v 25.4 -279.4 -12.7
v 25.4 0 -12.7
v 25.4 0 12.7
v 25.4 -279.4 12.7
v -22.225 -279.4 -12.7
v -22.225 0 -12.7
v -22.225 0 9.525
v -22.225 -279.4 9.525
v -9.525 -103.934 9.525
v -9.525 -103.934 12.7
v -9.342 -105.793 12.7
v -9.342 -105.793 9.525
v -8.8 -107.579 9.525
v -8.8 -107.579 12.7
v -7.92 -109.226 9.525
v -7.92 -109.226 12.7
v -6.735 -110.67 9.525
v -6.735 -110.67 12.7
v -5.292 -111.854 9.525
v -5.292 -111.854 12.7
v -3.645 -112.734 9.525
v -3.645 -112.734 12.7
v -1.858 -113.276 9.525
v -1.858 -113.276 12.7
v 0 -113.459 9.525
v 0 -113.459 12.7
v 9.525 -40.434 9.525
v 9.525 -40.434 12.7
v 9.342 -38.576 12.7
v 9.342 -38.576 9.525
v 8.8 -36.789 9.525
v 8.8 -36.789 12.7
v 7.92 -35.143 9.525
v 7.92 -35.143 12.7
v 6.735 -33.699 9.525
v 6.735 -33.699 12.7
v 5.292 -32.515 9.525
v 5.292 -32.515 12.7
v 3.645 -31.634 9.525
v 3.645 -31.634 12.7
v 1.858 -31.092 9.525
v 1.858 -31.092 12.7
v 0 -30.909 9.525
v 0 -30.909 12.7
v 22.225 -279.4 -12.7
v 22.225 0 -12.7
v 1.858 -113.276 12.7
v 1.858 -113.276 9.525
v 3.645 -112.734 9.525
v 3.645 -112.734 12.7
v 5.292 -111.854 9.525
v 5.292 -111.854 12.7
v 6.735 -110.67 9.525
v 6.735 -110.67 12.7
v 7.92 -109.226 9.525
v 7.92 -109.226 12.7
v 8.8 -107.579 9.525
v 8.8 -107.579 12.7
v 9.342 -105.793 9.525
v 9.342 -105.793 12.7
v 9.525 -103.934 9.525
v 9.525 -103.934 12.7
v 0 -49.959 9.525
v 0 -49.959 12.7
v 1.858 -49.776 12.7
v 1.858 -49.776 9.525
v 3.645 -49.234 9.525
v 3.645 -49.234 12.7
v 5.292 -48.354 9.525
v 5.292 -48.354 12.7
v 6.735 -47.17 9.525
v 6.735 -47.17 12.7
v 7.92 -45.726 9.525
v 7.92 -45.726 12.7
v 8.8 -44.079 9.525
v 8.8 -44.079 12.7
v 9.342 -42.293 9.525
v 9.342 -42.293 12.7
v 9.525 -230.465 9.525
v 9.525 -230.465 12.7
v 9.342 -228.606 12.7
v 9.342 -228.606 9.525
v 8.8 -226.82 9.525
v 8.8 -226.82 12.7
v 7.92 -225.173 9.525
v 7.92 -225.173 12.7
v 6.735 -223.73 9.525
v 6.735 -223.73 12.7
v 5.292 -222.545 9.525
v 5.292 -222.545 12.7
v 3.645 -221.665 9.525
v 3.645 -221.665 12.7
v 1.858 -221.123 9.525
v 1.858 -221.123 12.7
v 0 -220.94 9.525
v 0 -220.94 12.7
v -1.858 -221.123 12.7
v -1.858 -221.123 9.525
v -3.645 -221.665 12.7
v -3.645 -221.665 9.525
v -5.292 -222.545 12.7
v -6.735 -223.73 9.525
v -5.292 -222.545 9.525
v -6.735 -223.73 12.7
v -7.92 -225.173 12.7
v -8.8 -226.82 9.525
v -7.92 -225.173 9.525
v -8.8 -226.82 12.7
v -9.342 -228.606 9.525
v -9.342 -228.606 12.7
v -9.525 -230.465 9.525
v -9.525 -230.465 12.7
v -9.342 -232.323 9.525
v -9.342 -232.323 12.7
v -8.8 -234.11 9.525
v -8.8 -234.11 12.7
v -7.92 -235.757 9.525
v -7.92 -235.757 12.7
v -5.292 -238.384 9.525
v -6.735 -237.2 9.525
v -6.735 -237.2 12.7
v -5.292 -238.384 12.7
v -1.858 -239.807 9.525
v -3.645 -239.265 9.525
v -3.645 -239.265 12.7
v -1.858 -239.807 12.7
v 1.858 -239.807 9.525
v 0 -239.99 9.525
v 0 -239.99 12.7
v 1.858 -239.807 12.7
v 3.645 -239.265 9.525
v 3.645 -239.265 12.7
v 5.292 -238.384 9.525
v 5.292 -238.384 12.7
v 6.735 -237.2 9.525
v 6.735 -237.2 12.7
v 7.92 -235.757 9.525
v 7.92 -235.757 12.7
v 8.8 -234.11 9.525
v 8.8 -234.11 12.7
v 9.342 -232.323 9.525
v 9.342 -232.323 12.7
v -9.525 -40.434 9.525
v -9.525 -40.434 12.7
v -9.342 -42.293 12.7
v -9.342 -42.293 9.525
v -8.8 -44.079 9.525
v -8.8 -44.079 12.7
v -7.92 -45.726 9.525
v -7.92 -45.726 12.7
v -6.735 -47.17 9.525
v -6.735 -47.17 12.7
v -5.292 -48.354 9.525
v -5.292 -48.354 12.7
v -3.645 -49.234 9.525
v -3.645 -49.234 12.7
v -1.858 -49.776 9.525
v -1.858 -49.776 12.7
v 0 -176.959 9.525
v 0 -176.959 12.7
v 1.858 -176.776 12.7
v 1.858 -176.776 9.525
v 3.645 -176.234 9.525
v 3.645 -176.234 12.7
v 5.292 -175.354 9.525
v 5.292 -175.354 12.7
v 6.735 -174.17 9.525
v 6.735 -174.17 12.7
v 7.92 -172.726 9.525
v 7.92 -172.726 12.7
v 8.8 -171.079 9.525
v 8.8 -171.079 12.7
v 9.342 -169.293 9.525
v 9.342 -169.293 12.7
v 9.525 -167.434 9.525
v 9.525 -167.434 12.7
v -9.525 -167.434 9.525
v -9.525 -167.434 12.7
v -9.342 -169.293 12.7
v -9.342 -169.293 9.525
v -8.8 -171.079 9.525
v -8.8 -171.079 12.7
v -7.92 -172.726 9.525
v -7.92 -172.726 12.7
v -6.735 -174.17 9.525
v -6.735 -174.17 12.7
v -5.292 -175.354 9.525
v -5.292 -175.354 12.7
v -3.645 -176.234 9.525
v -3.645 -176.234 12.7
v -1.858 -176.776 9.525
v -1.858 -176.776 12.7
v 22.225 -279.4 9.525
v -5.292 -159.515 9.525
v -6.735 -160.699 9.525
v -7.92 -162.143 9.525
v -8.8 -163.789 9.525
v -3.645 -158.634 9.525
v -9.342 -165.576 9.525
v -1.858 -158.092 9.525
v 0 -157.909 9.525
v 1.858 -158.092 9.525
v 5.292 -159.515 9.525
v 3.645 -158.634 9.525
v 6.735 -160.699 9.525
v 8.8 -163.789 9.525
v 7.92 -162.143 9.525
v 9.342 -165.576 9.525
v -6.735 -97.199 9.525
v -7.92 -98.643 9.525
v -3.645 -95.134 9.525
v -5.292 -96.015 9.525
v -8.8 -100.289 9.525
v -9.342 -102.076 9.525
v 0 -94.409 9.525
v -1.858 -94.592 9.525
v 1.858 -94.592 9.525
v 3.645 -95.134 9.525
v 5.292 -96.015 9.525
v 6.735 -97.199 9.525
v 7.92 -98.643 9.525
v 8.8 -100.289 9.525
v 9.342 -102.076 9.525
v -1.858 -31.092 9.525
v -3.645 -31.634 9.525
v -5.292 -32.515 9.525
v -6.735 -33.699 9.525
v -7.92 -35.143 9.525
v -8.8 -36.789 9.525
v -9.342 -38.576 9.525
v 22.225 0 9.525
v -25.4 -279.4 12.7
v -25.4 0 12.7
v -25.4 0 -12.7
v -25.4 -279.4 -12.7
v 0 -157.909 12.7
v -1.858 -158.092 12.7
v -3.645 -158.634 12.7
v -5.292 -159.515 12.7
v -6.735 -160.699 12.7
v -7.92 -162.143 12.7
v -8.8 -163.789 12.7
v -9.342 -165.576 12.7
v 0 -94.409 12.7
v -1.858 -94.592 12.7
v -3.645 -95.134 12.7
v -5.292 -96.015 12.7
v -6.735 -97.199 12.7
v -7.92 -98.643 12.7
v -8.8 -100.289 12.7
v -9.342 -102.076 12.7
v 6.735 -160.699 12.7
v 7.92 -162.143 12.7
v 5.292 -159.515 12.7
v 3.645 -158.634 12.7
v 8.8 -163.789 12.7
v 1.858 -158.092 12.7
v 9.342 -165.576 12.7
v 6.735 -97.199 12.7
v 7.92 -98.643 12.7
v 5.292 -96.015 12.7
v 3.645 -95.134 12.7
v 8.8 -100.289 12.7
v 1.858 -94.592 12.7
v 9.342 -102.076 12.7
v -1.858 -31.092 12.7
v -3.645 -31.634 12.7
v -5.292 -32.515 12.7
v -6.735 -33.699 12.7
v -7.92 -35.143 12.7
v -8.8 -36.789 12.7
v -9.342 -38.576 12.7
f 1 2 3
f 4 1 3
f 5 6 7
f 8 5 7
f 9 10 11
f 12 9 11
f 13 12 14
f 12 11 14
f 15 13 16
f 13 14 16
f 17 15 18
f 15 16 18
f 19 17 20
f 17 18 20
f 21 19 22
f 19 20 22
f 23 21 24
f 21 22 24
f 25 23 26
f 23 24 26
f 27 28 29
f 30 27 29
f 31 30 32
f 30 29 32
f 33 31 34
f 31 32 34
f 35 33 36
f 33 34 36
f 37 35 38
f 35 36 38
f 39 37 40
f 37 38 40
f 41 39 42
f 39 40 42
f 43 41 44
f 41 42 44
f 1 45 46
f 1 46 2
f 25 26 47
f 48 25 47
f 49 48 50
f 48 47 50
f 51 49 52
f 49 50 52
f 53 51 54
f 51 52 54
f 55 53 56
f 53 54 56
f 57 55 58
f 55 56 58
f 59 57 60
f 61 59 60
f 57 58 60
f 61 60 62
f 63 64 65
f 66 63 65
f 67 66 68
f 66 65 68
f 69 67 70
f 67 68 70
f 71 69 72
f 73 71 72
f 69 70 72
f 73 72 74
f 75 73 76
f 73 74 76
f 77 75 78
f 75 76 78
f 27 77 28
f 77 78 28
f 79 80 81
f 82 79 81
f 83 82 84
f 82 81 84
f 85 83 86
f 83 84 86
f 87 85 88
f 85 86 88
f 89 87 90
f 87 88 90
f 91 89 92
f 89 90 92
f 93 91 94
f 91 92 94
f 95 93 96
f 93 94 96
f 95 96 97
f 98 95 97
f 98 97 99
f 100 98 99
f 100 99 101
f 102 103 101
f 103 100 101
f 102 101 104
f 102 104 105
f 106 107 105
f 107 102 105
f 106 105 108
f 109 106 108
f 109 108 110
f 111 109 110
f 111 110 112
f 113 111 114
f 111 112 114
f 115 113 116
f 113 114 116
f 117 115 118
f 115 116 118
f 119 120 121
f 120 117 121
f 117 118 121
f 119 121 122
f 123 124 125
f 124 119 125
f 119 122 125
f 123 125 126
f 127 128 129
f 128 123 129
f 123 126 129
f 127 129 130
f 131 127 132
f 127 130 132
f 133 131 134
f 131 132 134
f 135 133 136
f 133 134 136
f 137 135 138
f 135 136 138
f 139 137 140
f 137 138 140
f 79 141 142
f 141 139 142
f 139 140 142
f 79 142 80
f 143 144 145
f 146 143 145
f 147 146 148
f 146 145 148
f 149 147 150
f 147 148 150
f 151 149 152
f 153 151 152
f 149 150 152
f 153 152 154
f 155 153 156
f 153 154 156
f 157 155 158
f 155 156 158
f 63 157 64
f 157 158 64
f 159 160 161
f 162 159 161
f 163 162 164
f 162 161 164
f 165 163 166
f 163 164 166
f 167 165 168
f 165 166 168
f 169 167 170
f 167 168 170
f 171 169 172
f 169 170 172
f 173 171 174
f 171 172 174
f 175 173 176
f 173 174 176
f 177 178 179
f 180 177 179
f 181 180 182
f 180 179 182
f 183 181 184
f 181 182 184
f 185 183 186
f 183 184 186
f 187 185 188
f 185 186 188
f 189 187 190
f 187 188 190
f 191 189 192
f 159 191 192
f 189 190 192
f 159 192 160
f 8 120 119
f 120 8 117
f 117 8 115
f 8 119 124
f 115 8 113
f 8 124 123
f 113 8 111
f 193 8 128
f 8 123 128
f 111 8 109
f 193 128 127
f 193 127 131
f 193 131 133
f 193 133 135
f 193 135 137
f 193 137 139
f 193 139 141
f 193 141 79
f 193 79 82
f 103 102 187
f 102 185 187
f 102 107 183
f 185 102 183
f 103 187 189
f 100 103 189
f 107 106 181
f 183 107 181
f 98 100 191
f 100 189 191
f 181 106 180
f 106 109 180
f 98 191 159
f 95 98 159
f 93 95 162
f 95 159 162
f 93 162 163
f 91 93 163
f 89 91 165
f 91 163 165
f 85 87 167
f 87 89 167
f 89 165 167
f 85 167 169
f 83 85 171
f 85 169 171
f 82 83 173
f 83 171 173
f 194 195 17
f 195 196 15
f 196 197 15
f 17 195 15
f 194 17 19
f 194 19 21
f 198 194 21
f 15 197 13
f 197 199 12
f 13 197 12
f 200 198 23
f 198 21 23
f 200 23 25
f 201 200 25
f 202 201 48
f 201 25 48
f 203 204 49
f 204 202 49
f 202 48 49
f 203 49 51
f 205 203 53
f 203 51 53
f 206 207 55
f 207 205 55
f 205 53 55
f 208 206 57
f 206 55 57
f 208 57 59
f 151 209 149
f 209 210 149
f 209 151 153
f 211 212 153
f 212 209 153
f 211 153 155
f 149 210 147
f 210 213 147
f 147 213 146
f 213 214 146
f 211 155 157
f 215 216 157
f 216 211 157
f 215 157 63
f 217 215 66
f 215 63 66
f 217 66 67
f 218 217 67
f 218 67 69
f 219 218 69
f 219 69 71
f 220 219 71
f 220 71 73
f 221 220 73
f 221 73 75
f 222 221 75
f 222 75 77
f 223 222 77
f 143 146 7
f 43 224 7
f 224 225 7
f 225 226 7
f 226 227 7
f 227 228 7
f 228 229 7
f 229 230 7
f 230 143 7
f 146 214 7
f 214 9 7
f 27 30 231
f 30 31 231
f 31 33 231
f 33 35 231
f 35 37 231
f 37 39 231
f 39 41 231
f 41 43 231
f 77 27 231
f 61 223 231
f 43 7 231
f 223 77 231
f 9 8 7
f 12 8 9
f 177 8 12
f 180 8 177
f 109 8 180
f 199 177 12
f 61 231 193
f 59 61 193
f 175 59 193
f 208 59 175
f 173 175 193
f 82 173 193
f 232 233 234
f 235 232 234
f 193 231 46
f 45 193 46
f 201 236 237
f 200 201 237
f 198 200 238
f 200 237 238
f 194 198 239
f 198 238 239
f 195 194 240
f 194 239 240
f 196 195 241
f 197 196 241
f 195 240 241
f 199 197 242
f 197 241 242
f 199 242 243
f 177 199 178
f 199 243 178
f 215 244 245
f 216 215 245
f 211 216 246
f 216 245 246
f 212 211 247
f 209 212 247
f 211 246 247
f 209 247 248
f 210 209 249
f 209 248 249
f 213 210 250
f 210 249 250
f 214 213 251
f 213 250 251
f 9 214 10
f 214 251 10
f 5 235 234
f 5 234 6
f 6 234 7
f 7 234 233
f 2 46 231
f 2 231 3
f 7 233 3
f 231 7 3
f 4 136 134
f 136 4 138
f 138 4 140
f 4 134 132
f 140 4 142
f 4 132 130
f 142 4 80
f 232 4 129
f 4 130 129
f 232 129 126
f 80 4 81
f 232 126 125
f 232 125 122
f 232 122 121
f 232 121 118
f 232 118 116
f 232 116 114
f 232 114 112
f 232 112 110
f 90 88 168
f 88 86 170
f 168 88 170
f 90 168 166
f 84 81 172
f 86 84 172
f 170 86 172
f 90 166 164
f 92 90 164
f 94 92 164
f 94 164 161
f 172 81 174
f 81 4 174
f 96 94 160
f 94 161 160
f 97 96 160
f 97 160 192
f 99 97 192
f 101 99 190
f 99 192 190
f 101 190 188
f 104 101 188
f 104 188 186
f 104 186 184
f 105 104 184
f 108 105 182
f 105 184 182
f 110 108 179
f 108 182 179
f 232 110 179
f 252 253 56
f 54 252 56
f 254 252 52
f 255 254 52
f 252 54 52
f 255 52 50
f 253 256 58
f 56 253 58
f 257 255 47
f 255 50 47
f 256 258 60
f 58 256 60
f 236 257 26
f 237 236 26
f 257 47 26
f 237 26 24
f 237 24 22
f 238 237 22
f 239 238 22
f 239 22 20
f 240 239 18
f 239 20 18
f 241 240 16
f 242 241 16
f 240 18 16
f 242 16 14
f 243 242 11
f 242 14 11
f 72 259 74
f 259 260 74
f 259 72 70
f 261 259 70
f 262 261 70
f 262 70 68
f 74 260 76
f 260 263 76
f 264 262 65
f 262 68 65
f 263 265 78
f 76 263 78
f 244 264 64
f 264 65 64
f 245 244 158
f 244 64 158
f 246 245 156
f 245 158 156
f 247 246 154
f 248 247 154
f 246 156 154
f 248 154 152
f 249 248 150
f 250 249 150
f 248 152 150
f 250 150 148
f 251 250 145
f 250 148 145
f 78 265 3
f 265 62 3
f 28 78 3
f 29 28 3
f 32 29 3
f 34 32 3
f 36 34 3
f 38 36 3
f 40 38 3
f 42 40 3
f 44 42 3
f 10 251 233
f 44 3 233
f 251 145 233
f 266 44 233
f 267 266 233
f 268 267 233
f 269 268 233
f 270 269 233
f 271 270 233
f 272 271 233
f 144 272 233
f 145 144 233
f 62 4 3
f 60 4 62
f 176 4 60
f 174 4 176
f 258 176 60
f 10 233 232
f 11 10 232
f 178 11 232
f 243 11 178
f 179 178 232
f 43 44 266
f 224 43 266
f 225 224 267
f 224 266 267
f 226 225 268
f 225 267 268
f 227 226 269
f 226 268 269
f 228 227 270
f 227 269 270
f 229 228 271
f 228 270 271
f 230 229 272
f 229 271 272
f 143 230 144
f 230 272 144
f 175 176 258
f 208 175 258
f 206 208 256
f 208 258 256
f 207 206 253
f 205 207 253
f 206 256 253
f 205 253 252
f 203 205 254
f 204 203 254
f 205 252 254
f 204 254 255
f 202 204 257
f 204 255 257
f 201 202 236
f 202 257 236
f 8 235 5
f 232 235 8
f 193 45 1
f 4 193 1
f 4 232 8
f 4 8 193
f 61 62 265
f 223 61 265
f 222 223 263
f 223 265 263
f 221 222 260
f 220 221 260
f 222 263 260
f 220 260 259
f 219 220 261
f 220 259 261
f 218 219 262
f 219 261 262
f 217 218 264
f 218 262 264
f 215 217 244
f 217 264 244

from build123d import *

# Parameters (mm, degrees)
F1_DEPTH = 279.4
F3_DEPTH = 25.401
F5_D     = 19.05


# Not quite as in the source:
# - a feature names something its author has since deleted; it is built from what else it names


with BuildPart() as f1:
    # F0 (on Front) → F1 (new body)
    with BuildSketch(Plane.XZ):
        Polygon((25.4, -12.7), (25.4, 12.7), (-25.4, 12.7), (-25.4, -12.7), (-22.225, -12.7), (-22.225, 9.525), (22.225, 9.525), (22.225, -12.7), align=None)
    extrude(amount=F1_DEPTH)

    # F2 (on face) → F3 (cut, through all)
    with BuildSketch(Plane.XY.offset(12.7)):
        with BuildLine():
            Line((0, -40.4343813046), (9.525, -40.4343813046))
            ThreePointArc((9.525, -40.4343813046), (6.7351920908, -33.6991892138), (0, -30.9093813046))
            Line((0, -30.9093813046), (0, -40.4343813046))
        make_face()
        with BuildLine():
            ThreePointArc((0, -30.9093813046), (-6.7351920908, -33.6991892138), (-9.525, -40.4343813046))
            Line((-9.525, -40.4343813046), (0, -40.4343813046))
            Line((0, -40.4343813046), (0, -30.9093813046))
        make_face()
        with BuildLine():
            Line((0, -40.4343813046), (-9.525, -40.4343813046))
            ThreePointArc((-9.525, -40.4343813046), (-6.7351920908, -47.1695733954), (0, -49.9593813046))
            Line((0, -49.9593813046), (0, -40.4343813046))
        make_face()
        with BuildLine():
            Line((0, -103.9343813046), (9.525, -103.9343813046))
            ThreePointArc((9.525, -103.9343813046), (6.7351920908, -97.1991892138), (0, -94.4093813046))
            Line((0, -94.4093813046), (0, -103.9343813046))
        make_face()
        with BuildLine():
            ThreePointArc((0, -94.4093813046), (-6.7351920908, -97.1991892138), (-9.525, -103.9343813046))
            Line((-9.525, -103.9343813046), (0, -103.9343813046))
            Line((0, -103.9343813046), (0, -94.4093813046))
        make_face()
        with BuildLine():
            ThreePointArc((0, -113.4593813046), (6.7351920908, -110.6695733954), (9.525, -103.9343813046))
            Line((9.525, -103.9343813046), (0, -103.9343813046))
            Line((0, -103.9343813046), (0, -113.4593813046))
        make_face()
        with BuildLine():
            Line((0, -103.9343813046), (-9.525, -103.9343813046))
            ThreePointArc((-9.525, -103.9343813046), (-6.7351920908, -110.6695733954), (0, -113.4593813046))
            Line((0, -113.4593813046), (0, -103.9343813046))
        make_face()
        with BuildLine():
            Line((0, -167.4343813046), (9.525, -167.4343813046))
            ThreePointArc((9.525, -167.4343813046), (6.7351920908, -160.6991892138), (0, -157.9093813046))
            Line((0, -157.9093813046), (0, -167.4343813046))
        make_face()
        with BuildLine():
            ThreePointArc((0, -157.9093813046), (-6.7351920908, -160.6991892138), (-9.525, -167.4343813046))
            Line((-9.525, -167.4343813046), (0, -167.4343813046))
            Line((0, -167.4343813046), (0, -157.9093813046))
        make_face()
        with BuildLine():
            Line((0, -167.4343813046), (0, -176.9593813046))
            ThreePointArc((0, -176.9593813046), (6.7351920908, -174.1695733954), (9.525, -167.4343813046))
            Line((9.525, -167.4343813046), (0, -167.4343813046))
        make_face()
        with BuildLine():
            ThreePointArc((-9.525, -167.4343813046), (-6.7351920908, -174.1695733954), (0, -176.9593813046))
            Line((0, -176.9593813046), (0, -167.4343813046))
            Line((0, -167.4343813046), (-9.525, -167.4343813046))
        make_face()
        with BuildLine():
            Line((0, -220.9396968842), (0, -230.4646968842))
            Line((0, -230.4646968842), (9.525, -230.4646968842))
            ThreePointArc((9.525, -230.4646968842), (6.7351920908, -223.7295047934), (0, -220.9396968842))
        make_face()
        with BuildLine():
            Line((-9.525, -230.4646968842), (0, -230.4646968842))
            Line((0, -230.4646968842), (0, -220.9396968842))
            ThreePointArc((0, -220.9396968842), (-6.7351920908, -223.7295047934), (-9.525, -230.4646968842))
        make_face()
        with BuildLine():
            ThreePointArc((0, -49.9593813046), (6.7351920908, -47.1695733954), (9.525, -40.4343813046))
            Line((9.525, -40.4343813046), (0, -40.4343813046))
            Line((0, -40.4343813046), (0, -49.9593813046))
        make_face()
    extrude(amount=-F3_DEPTH, mode=Mode.SUBTRACT)

    # F5 (through all)
    with Locations(Plane.XY.offset(12.7)):
        with Locations((0, -230.4646968842)):
            Hole(F5_D / 2)


solid = f1.part
